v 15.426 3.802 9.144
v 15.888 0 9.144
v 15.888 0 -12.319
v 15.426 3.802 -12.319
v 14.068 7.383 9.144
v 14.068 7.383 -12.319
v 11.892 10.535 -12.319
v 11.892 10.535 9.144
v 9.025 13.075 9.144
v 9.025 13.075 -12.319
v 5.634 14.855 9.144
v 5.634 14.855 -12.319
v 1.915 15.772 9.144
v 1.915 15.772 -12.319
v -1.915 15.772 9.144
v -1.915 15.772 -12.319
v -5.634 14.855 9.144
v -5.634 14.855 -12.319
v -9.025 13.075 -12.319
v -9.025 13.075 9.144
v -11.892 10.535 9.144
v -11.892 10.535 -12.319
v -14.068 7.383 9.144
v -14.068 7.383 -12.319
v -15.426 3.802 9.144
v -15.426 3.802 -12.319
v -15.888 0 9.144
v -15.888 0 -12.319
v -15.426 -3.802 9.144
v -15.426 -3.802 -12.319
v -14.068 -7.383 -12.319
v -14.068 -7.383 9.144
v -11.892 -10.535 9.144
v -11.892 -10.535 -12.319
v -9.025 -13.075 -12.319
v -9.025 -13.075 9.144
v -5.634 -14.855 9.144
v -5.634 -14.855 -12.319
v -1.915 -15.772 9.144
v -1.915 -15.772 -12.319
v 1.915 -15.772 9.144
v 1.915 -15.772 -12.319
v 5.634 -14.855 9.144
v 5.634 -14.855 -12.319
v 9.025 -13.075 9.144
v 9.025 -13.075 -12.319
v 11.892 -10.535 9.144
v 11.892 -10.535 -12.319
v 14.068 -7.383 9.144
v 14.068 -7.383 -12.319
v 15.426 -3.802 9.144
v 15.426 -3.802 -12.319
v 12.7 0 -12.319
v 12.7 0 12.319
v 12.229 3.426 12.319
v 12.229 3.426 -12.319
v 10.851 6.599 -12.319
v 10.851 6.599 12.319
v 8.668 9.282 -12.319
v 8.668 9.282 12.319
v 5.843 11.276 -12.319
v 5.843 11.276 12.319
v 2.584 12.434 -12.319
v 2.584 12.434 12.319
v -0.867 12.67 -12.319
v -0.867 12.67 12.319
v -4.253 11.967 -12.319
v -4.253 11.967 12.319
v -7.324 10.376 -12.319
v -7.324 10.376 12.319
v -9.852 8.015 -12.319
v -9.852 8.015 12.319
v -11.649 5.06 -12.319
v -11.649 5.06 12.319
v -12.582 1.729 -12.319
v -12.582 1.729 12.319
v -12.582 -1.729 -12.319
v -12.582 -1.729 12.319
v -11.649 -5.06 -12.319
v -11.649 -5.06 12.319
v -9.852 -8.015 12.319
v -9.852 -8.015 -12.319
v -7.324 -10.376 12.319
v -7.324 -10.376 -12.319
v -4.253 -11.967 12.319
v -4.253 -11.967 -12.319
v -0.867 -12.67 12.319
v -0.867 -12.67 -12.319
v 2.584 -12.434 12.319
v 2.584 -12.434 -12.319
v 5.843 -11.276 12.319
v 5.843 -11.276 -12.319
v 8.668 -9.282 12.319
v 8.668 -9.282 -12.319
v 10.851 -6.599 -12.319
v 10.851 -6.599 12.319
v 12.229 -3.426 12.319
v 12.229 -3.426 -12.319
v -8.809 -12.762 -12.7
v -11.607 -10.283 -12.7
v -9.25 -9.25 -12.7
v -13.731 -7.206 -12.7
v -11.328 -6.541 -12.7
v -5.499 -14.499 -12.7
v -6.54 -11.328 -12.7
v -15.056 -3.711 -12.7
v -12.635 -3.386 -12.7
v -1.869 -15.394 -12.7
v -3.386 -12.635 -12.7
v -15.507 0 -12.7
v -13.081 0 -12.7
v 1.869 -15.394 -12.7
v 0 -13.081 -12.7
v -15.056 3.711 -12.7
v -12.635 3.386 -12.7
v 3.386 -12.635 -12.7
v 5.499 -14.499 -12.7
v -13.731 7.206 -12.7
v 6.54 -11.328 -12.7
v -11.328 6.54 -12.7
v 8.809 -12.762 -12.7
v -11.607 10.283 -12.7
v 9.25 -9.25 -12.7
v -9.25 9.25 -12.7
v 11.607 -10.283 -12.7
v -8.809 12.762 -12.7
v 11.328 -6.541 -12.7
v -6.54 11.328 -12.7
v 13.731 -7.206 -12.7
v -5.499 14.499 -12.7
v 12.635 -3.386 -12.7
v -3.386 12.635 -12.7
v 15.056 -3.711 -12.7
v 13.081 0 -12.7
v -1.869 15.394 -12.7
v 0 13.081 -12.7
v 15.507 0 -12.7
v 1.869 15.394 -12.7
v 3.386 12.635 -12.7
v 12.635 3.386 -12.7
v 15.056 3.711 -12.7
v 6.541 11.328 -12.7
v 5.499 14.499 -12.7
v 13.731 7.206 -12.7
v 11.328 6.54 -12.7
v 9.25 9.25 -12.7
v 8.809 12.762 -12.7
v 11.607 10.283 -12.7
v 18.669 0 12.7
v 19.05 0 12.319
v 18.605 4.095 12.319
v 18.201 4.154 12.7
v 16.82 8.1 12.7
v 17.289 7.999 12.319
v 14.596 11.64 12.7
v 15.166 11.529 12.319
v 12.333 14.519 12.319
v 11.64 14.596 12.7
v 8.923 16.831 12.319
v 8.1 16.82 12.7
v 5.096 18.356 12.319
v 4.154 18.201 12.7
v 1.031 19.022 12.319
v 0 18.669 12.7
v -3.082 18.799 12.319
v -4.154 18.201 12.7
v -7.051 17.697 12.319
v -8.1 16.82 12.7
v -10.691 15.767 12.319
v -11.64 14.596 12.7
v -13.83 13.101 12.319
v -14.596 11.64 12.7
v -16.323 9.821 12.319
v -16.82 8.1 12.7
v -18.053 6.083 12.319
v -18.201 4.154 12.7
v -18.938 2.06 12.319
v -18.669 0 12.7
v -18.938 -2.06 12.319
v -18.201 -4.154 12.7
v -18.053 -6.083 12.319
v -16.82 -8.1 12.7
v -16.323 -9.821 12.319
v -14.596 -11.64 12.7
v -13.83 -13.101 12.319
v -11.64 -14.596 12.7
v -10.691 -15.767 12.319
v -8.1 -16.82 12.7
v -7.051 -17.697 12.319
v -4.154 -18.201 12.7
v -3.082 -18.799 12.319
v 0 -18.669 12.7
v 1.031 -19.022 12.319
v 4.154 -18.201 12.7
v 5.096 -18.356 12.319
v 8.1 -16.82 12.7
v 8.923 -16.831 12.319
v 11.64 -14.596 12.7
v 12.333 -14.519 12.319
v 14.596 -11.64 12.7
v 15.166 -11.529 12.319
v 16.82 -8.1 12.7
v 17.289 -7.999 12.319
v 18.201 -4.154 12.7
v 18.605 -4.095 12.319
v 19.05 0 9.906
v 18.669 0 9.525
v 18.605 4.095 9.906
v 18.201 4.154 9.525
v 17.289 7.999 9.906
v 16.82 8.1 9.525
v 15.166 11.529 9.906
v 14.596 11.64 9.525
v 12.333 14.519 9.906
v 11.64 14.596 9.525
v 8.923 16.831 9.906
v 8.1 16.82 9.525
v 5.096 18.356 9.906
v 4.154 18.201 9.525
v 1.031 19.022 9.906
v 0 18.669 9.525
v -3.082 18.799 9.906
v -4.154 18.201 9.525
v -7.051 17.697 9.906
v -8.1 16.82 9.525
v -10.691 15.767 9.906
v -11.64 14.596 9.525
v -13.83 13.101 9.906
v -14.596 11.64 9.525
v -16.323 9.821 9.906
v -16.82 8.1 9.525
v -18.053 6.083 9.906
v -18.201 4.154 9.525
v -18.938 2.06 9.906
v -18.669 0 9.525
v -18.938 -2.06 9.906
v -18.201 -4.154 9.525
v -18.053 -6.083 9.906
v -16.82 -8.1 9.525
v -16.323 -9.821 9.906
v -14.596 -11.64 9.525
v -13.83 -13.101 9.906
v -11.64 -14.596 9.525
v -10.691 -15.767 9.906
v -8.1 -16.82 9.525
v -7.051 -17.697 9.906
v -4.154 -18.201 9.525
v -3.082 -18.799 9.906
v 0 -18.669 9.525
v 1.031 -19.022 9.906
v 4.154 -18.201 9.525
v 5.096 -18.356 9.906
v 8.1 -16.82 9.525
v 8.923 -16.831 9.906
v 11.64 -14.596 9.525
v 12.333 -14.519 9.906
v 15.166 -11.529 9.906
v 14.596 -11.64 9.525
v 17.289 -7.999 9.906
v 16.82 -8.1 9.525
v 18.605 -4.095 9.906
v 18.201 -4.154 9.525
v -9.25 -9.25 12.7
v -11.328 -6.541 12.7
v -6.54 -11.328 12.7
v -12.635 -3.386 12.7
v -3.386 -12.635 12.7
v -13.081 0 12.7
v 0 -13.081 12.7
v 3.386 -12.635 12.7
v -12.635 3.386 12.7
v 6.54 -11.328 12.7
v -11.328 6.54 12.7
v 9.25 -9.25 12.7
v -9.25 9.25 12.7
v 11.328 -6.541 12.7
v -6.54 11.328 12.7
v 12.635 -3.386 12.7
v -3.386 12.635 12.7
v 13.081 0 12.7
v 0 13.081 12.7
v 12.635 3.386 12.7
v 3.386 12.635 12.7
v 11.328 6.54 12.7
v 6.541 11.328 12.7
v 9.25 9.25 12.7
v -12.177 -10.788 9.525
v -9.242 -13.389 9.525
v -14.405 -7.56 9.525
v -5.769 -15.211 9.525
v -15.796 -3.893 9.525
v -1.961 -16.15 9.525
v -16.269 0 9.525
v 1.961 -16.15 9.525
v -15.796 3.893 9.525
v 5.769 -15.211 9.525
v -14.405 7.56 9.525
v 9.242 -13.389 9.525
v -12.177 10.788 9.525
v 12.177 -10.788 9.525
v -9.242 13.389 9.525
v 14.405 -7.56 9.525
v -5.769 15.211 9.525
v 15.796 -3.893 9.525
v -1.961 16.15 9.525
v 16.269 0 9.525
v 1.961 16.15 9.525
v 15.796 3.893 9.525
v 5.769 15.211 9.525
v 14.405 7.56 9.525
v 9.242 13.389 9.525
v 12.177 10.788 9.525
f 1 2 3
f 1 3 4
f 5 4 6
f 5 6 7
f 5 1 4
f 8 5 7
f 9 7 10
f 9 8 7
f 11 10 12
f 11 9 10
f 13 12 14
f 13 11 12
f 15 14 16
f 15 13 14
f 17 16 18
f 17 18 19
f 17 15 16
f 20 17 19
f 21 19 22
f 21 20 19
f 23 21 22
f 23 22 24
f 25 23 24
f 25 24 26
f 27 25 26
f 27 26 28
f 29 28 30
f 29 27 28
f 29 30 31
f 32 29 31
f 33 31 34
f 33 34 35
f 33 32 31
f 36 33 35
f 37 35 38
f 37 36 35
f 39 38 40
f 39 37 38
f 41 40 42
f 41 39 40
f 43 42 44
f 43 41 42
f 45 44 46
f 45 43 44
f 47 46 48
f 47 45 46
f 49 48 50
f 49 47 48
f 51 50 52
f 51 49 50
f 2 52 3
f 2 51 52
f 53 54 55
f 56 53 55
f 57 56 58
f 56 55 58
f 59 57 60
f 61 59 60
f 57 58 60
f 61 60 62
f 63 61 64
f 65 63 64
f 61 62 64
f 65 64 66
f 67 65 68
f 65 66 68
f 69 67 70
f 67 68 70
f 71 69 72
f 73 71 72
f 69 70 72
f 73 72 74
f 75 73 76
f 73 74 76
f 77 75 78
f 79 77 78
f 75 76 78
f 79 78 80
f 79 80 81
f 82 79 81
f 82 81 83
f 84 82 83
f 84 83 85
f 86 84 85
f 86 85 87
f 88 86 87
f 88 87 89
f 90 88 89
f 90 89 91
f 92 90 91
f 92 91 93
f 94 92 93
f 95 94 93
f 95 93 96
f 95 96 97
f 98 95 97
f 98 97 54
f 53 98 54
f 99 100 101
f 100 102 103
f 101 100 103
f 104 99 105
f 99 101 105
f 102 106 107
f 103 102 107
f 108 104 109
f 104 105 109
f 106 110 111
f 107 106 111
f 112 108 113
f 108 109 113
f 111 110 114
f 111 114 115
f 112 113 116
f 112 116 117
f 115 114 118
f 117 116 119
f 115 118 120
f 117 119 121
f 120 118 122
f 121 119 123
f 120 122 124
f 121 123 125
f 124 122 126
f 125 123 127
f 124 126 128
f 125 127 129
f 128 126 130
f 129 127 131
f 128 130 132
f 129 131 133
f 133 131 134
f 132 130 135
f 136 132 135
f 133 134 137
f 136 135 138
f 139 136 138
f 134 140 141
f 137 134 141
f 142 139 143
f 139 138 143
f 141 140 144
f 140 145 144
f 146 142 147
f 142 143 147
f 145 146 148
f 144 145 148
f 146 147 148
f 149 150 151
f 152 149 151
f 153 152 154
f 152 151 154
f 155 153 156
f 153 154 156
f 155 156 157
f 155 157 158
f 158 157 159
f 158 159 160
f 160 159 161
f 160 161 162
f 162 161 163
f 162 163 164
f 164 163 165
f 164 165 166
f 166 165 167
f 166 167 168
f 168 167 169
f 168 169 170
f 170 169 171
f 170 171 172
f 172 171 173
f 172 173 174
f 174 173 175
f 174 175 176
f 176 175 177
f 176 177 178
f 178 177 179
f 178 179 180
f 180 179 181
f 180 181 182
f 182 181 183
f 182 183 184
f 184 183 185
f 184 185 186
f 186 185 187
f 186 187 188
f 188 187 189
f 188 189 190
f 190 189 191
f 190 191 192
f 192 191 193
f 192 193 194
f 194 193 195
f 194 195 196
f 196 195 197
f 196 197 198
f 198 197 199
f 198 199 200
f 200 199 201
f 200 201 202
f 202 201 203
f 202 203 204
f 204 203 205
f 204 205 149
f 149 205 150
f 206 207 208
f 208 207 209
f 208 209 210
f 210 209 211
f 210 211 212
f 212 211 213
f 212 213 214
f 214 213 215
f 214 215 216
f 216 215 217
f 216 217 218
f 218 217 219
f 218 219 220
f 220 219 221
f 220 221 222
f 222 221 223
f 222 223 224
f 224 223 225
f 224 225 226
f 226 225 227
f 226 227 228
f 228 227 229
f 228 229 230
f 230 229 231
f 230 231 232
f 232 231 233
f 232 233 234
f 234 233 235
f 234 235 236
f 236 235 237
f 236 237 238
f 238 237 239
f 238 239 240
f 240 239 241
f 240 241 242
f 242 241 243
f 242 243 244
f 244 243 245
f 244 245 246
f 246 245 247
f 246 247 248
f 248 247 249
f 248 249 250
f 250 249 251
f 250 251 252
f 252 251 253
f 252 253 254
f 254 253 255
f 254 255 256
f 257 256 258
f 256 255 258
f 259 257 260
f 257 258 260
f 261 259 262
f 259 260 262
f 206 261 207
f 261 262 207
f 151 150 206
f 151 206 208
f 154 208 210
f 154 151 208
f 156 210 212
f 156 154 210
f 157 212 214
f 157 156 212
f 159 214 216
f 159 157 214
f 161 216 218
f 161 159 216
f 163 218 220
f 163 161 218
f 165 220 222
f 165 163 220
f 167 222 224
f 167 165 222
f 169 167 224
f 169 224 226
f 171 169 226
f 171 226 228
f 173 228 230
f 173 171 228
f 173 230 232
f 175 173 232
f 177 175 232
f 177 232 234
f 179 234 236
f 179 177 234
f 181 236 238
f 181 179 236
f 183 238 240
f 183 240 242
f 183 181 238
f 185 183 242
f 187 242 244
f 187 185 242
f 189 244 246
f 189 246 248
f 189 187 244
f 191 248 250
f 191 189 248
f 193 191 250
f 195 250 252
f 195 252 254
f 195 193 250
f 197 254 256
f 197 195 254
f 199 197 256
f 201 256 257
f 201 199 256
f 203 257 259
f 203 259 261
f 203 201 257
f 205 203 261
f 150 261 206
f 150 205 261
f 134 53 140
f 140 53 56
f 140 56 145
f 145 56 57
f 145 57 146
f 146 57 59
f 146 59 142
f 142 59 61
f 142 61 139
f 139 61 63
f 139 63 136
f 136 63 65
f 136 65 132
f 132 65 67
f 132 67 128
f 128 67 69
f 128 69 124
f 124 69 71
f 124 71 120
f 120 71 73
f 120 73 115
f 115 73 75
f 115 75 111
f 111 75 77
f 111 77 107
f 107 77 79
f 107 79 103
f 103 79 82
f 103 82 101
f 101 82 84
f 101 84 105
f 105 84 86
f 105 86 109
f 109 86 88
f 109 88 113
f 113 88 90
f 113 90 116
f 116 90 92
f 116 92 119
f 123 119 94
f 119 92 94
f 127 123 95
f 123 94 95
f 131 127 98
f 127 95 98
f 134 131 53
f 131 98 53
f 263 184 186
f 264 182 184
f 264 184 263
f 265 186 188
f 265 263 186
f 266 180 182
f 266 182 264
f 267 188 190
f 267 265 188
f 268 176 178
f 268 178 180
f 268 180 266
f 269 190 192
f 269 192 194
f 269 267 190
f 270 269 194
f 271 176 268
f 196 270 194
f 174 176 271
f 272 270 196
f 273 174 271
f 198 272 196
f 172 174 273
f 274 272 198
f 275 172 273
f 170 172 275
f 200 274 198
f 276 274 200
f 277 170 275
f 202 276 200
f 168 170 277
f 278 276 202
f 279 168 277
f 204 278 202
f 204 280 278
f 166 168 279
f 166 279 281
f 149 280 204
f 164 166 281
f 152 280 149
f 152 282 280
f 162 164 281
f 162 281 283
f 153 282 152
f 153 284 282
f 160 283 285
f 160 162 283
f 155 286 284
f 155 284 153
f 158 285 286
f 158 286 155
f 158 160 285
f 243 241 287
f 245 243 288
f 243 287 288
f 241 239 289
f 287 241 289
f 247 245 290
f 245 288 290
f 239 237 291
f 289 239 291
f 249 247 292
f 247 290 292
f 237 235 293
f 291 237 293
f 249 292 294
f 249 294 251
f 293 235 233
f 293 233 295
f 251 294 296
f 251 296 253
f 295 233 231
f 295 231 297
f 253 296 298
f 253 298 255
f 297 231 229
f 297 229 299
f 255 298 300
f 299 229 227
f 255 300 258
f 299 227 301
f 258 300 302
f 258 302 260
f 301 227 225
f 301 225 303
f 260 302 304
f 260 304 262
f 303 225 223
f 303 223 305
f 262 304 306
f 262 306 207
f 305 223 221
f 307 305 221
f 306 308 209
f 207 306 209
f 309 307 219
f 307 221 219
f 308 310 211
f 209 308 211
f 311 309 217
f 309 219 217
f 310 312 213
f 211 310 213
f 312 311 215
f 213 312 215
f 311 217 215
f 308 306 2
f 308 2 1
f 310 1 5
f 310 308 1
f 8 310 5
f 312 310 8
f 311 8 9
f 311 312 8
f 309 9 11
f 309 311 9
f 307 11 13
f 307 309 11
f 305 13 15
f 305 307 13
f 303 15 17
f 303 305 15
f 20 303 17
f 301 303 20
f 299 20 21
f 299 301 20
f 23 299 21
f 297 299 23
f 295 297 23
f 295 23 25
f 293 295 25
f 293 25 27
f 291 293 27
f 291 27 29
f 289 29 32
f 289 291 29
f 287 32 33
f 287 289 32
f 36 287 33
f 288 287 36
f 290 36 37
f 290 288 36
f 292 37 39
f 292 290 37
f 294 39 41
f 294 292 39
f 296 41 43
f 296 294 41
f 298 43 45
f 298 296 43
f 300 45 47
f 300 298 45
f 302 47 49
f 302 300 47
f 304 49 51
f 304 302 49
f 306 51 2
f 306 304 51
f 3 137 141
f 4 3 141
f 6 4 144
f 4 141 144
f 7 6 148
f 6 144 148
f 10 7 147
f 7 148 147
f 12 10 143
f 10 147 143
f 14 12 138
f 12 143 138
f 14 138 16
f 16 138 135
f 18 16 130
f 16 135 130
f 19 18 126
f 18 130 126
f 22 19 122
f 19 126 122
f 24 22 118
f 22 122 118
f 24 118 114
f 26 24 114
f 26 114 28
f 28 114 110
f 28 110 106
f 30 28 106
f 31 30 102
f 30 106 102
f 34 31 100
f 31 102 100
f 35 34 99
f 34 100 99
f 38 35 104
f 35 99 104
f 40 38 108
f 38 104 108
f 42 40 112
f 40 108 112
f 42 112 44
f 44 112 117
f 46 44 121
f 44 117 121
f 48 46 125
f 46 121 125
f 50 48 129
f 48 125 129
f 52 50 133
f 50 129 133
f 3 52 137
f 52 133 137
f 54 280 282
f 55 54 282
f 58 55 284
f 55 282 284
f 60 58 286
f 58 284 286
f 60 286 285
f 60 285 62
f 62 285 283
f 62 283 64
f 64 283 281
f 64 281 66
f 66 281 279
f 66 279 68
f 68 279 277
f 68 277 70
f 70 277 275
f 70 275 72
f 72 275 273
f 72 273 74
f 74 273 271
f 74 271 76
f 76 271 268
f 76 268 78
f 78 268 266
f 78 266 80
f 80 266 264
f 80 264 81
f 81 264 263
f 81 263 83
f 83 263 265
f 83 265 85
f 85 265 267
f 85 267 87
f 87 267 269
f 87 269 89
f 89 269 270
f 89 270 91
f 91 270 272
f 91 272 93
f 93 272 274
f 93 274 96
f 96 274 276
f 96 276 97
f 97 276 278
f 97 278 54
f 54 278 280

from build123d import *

# Parameters (mm, degrees)
BOSS_EXTRUDE1_START = 12.7
SKETCH3_R           = 19.05
SKETCH3_R_2         = 12.7
BOSS_EXTRUDE1_DEPTH = 3.175
BOSS_EXTRUDE2_START = 9.525
SKETCH4_R           = 15.8877
SKETCH4_R_2         = 12.7
BOSS_EXTRUDE2_DEPTH = 22.225
CHAMFER1_SIZE       = 0.381


with BuildPart() as part:
    # Sketch3 → Boss-Extrude1 (new body)
    with BuildSketch(Plane.XY.offset(BOSS_EXTRUDE1_START)):
        Circle(SKETCH3_R)
        Circle(SKETCH3_R_2, mode=Mode.SUBTRACT)
    extrude(amount=-BOSS_EXTRUDE1_DEPTH)

    # Sketch4 → Boss-Extrude2 (add)
    with BuildSketch(Plane.XY.offset(BOSS_EXTRUDE2_START)):
        Circle(SKETCH4_R)
        Circle(SKETCH4_R_2, mode=Mode.SUBTRACT)
    extrude(amount=-BOSS_EXTRUDE2_DEPTH)

    # Chamfer1
    chamfer1_edges = [part.edges().sort_by_distance(p)[0] for p in [
        (-12.7, 0, -12.7),
        (-15.8877, 0, 9.525),
        (-19.05, 0, 12.7),
        (-19.05, 0, 9.525),
        (-12.7, 0, 12.7),
        (-15.8877, 0, -12.7),
    ]]
    chamfer(chamfer1_edges, length=CHAMFER1_SIZE)


solid = part.part
